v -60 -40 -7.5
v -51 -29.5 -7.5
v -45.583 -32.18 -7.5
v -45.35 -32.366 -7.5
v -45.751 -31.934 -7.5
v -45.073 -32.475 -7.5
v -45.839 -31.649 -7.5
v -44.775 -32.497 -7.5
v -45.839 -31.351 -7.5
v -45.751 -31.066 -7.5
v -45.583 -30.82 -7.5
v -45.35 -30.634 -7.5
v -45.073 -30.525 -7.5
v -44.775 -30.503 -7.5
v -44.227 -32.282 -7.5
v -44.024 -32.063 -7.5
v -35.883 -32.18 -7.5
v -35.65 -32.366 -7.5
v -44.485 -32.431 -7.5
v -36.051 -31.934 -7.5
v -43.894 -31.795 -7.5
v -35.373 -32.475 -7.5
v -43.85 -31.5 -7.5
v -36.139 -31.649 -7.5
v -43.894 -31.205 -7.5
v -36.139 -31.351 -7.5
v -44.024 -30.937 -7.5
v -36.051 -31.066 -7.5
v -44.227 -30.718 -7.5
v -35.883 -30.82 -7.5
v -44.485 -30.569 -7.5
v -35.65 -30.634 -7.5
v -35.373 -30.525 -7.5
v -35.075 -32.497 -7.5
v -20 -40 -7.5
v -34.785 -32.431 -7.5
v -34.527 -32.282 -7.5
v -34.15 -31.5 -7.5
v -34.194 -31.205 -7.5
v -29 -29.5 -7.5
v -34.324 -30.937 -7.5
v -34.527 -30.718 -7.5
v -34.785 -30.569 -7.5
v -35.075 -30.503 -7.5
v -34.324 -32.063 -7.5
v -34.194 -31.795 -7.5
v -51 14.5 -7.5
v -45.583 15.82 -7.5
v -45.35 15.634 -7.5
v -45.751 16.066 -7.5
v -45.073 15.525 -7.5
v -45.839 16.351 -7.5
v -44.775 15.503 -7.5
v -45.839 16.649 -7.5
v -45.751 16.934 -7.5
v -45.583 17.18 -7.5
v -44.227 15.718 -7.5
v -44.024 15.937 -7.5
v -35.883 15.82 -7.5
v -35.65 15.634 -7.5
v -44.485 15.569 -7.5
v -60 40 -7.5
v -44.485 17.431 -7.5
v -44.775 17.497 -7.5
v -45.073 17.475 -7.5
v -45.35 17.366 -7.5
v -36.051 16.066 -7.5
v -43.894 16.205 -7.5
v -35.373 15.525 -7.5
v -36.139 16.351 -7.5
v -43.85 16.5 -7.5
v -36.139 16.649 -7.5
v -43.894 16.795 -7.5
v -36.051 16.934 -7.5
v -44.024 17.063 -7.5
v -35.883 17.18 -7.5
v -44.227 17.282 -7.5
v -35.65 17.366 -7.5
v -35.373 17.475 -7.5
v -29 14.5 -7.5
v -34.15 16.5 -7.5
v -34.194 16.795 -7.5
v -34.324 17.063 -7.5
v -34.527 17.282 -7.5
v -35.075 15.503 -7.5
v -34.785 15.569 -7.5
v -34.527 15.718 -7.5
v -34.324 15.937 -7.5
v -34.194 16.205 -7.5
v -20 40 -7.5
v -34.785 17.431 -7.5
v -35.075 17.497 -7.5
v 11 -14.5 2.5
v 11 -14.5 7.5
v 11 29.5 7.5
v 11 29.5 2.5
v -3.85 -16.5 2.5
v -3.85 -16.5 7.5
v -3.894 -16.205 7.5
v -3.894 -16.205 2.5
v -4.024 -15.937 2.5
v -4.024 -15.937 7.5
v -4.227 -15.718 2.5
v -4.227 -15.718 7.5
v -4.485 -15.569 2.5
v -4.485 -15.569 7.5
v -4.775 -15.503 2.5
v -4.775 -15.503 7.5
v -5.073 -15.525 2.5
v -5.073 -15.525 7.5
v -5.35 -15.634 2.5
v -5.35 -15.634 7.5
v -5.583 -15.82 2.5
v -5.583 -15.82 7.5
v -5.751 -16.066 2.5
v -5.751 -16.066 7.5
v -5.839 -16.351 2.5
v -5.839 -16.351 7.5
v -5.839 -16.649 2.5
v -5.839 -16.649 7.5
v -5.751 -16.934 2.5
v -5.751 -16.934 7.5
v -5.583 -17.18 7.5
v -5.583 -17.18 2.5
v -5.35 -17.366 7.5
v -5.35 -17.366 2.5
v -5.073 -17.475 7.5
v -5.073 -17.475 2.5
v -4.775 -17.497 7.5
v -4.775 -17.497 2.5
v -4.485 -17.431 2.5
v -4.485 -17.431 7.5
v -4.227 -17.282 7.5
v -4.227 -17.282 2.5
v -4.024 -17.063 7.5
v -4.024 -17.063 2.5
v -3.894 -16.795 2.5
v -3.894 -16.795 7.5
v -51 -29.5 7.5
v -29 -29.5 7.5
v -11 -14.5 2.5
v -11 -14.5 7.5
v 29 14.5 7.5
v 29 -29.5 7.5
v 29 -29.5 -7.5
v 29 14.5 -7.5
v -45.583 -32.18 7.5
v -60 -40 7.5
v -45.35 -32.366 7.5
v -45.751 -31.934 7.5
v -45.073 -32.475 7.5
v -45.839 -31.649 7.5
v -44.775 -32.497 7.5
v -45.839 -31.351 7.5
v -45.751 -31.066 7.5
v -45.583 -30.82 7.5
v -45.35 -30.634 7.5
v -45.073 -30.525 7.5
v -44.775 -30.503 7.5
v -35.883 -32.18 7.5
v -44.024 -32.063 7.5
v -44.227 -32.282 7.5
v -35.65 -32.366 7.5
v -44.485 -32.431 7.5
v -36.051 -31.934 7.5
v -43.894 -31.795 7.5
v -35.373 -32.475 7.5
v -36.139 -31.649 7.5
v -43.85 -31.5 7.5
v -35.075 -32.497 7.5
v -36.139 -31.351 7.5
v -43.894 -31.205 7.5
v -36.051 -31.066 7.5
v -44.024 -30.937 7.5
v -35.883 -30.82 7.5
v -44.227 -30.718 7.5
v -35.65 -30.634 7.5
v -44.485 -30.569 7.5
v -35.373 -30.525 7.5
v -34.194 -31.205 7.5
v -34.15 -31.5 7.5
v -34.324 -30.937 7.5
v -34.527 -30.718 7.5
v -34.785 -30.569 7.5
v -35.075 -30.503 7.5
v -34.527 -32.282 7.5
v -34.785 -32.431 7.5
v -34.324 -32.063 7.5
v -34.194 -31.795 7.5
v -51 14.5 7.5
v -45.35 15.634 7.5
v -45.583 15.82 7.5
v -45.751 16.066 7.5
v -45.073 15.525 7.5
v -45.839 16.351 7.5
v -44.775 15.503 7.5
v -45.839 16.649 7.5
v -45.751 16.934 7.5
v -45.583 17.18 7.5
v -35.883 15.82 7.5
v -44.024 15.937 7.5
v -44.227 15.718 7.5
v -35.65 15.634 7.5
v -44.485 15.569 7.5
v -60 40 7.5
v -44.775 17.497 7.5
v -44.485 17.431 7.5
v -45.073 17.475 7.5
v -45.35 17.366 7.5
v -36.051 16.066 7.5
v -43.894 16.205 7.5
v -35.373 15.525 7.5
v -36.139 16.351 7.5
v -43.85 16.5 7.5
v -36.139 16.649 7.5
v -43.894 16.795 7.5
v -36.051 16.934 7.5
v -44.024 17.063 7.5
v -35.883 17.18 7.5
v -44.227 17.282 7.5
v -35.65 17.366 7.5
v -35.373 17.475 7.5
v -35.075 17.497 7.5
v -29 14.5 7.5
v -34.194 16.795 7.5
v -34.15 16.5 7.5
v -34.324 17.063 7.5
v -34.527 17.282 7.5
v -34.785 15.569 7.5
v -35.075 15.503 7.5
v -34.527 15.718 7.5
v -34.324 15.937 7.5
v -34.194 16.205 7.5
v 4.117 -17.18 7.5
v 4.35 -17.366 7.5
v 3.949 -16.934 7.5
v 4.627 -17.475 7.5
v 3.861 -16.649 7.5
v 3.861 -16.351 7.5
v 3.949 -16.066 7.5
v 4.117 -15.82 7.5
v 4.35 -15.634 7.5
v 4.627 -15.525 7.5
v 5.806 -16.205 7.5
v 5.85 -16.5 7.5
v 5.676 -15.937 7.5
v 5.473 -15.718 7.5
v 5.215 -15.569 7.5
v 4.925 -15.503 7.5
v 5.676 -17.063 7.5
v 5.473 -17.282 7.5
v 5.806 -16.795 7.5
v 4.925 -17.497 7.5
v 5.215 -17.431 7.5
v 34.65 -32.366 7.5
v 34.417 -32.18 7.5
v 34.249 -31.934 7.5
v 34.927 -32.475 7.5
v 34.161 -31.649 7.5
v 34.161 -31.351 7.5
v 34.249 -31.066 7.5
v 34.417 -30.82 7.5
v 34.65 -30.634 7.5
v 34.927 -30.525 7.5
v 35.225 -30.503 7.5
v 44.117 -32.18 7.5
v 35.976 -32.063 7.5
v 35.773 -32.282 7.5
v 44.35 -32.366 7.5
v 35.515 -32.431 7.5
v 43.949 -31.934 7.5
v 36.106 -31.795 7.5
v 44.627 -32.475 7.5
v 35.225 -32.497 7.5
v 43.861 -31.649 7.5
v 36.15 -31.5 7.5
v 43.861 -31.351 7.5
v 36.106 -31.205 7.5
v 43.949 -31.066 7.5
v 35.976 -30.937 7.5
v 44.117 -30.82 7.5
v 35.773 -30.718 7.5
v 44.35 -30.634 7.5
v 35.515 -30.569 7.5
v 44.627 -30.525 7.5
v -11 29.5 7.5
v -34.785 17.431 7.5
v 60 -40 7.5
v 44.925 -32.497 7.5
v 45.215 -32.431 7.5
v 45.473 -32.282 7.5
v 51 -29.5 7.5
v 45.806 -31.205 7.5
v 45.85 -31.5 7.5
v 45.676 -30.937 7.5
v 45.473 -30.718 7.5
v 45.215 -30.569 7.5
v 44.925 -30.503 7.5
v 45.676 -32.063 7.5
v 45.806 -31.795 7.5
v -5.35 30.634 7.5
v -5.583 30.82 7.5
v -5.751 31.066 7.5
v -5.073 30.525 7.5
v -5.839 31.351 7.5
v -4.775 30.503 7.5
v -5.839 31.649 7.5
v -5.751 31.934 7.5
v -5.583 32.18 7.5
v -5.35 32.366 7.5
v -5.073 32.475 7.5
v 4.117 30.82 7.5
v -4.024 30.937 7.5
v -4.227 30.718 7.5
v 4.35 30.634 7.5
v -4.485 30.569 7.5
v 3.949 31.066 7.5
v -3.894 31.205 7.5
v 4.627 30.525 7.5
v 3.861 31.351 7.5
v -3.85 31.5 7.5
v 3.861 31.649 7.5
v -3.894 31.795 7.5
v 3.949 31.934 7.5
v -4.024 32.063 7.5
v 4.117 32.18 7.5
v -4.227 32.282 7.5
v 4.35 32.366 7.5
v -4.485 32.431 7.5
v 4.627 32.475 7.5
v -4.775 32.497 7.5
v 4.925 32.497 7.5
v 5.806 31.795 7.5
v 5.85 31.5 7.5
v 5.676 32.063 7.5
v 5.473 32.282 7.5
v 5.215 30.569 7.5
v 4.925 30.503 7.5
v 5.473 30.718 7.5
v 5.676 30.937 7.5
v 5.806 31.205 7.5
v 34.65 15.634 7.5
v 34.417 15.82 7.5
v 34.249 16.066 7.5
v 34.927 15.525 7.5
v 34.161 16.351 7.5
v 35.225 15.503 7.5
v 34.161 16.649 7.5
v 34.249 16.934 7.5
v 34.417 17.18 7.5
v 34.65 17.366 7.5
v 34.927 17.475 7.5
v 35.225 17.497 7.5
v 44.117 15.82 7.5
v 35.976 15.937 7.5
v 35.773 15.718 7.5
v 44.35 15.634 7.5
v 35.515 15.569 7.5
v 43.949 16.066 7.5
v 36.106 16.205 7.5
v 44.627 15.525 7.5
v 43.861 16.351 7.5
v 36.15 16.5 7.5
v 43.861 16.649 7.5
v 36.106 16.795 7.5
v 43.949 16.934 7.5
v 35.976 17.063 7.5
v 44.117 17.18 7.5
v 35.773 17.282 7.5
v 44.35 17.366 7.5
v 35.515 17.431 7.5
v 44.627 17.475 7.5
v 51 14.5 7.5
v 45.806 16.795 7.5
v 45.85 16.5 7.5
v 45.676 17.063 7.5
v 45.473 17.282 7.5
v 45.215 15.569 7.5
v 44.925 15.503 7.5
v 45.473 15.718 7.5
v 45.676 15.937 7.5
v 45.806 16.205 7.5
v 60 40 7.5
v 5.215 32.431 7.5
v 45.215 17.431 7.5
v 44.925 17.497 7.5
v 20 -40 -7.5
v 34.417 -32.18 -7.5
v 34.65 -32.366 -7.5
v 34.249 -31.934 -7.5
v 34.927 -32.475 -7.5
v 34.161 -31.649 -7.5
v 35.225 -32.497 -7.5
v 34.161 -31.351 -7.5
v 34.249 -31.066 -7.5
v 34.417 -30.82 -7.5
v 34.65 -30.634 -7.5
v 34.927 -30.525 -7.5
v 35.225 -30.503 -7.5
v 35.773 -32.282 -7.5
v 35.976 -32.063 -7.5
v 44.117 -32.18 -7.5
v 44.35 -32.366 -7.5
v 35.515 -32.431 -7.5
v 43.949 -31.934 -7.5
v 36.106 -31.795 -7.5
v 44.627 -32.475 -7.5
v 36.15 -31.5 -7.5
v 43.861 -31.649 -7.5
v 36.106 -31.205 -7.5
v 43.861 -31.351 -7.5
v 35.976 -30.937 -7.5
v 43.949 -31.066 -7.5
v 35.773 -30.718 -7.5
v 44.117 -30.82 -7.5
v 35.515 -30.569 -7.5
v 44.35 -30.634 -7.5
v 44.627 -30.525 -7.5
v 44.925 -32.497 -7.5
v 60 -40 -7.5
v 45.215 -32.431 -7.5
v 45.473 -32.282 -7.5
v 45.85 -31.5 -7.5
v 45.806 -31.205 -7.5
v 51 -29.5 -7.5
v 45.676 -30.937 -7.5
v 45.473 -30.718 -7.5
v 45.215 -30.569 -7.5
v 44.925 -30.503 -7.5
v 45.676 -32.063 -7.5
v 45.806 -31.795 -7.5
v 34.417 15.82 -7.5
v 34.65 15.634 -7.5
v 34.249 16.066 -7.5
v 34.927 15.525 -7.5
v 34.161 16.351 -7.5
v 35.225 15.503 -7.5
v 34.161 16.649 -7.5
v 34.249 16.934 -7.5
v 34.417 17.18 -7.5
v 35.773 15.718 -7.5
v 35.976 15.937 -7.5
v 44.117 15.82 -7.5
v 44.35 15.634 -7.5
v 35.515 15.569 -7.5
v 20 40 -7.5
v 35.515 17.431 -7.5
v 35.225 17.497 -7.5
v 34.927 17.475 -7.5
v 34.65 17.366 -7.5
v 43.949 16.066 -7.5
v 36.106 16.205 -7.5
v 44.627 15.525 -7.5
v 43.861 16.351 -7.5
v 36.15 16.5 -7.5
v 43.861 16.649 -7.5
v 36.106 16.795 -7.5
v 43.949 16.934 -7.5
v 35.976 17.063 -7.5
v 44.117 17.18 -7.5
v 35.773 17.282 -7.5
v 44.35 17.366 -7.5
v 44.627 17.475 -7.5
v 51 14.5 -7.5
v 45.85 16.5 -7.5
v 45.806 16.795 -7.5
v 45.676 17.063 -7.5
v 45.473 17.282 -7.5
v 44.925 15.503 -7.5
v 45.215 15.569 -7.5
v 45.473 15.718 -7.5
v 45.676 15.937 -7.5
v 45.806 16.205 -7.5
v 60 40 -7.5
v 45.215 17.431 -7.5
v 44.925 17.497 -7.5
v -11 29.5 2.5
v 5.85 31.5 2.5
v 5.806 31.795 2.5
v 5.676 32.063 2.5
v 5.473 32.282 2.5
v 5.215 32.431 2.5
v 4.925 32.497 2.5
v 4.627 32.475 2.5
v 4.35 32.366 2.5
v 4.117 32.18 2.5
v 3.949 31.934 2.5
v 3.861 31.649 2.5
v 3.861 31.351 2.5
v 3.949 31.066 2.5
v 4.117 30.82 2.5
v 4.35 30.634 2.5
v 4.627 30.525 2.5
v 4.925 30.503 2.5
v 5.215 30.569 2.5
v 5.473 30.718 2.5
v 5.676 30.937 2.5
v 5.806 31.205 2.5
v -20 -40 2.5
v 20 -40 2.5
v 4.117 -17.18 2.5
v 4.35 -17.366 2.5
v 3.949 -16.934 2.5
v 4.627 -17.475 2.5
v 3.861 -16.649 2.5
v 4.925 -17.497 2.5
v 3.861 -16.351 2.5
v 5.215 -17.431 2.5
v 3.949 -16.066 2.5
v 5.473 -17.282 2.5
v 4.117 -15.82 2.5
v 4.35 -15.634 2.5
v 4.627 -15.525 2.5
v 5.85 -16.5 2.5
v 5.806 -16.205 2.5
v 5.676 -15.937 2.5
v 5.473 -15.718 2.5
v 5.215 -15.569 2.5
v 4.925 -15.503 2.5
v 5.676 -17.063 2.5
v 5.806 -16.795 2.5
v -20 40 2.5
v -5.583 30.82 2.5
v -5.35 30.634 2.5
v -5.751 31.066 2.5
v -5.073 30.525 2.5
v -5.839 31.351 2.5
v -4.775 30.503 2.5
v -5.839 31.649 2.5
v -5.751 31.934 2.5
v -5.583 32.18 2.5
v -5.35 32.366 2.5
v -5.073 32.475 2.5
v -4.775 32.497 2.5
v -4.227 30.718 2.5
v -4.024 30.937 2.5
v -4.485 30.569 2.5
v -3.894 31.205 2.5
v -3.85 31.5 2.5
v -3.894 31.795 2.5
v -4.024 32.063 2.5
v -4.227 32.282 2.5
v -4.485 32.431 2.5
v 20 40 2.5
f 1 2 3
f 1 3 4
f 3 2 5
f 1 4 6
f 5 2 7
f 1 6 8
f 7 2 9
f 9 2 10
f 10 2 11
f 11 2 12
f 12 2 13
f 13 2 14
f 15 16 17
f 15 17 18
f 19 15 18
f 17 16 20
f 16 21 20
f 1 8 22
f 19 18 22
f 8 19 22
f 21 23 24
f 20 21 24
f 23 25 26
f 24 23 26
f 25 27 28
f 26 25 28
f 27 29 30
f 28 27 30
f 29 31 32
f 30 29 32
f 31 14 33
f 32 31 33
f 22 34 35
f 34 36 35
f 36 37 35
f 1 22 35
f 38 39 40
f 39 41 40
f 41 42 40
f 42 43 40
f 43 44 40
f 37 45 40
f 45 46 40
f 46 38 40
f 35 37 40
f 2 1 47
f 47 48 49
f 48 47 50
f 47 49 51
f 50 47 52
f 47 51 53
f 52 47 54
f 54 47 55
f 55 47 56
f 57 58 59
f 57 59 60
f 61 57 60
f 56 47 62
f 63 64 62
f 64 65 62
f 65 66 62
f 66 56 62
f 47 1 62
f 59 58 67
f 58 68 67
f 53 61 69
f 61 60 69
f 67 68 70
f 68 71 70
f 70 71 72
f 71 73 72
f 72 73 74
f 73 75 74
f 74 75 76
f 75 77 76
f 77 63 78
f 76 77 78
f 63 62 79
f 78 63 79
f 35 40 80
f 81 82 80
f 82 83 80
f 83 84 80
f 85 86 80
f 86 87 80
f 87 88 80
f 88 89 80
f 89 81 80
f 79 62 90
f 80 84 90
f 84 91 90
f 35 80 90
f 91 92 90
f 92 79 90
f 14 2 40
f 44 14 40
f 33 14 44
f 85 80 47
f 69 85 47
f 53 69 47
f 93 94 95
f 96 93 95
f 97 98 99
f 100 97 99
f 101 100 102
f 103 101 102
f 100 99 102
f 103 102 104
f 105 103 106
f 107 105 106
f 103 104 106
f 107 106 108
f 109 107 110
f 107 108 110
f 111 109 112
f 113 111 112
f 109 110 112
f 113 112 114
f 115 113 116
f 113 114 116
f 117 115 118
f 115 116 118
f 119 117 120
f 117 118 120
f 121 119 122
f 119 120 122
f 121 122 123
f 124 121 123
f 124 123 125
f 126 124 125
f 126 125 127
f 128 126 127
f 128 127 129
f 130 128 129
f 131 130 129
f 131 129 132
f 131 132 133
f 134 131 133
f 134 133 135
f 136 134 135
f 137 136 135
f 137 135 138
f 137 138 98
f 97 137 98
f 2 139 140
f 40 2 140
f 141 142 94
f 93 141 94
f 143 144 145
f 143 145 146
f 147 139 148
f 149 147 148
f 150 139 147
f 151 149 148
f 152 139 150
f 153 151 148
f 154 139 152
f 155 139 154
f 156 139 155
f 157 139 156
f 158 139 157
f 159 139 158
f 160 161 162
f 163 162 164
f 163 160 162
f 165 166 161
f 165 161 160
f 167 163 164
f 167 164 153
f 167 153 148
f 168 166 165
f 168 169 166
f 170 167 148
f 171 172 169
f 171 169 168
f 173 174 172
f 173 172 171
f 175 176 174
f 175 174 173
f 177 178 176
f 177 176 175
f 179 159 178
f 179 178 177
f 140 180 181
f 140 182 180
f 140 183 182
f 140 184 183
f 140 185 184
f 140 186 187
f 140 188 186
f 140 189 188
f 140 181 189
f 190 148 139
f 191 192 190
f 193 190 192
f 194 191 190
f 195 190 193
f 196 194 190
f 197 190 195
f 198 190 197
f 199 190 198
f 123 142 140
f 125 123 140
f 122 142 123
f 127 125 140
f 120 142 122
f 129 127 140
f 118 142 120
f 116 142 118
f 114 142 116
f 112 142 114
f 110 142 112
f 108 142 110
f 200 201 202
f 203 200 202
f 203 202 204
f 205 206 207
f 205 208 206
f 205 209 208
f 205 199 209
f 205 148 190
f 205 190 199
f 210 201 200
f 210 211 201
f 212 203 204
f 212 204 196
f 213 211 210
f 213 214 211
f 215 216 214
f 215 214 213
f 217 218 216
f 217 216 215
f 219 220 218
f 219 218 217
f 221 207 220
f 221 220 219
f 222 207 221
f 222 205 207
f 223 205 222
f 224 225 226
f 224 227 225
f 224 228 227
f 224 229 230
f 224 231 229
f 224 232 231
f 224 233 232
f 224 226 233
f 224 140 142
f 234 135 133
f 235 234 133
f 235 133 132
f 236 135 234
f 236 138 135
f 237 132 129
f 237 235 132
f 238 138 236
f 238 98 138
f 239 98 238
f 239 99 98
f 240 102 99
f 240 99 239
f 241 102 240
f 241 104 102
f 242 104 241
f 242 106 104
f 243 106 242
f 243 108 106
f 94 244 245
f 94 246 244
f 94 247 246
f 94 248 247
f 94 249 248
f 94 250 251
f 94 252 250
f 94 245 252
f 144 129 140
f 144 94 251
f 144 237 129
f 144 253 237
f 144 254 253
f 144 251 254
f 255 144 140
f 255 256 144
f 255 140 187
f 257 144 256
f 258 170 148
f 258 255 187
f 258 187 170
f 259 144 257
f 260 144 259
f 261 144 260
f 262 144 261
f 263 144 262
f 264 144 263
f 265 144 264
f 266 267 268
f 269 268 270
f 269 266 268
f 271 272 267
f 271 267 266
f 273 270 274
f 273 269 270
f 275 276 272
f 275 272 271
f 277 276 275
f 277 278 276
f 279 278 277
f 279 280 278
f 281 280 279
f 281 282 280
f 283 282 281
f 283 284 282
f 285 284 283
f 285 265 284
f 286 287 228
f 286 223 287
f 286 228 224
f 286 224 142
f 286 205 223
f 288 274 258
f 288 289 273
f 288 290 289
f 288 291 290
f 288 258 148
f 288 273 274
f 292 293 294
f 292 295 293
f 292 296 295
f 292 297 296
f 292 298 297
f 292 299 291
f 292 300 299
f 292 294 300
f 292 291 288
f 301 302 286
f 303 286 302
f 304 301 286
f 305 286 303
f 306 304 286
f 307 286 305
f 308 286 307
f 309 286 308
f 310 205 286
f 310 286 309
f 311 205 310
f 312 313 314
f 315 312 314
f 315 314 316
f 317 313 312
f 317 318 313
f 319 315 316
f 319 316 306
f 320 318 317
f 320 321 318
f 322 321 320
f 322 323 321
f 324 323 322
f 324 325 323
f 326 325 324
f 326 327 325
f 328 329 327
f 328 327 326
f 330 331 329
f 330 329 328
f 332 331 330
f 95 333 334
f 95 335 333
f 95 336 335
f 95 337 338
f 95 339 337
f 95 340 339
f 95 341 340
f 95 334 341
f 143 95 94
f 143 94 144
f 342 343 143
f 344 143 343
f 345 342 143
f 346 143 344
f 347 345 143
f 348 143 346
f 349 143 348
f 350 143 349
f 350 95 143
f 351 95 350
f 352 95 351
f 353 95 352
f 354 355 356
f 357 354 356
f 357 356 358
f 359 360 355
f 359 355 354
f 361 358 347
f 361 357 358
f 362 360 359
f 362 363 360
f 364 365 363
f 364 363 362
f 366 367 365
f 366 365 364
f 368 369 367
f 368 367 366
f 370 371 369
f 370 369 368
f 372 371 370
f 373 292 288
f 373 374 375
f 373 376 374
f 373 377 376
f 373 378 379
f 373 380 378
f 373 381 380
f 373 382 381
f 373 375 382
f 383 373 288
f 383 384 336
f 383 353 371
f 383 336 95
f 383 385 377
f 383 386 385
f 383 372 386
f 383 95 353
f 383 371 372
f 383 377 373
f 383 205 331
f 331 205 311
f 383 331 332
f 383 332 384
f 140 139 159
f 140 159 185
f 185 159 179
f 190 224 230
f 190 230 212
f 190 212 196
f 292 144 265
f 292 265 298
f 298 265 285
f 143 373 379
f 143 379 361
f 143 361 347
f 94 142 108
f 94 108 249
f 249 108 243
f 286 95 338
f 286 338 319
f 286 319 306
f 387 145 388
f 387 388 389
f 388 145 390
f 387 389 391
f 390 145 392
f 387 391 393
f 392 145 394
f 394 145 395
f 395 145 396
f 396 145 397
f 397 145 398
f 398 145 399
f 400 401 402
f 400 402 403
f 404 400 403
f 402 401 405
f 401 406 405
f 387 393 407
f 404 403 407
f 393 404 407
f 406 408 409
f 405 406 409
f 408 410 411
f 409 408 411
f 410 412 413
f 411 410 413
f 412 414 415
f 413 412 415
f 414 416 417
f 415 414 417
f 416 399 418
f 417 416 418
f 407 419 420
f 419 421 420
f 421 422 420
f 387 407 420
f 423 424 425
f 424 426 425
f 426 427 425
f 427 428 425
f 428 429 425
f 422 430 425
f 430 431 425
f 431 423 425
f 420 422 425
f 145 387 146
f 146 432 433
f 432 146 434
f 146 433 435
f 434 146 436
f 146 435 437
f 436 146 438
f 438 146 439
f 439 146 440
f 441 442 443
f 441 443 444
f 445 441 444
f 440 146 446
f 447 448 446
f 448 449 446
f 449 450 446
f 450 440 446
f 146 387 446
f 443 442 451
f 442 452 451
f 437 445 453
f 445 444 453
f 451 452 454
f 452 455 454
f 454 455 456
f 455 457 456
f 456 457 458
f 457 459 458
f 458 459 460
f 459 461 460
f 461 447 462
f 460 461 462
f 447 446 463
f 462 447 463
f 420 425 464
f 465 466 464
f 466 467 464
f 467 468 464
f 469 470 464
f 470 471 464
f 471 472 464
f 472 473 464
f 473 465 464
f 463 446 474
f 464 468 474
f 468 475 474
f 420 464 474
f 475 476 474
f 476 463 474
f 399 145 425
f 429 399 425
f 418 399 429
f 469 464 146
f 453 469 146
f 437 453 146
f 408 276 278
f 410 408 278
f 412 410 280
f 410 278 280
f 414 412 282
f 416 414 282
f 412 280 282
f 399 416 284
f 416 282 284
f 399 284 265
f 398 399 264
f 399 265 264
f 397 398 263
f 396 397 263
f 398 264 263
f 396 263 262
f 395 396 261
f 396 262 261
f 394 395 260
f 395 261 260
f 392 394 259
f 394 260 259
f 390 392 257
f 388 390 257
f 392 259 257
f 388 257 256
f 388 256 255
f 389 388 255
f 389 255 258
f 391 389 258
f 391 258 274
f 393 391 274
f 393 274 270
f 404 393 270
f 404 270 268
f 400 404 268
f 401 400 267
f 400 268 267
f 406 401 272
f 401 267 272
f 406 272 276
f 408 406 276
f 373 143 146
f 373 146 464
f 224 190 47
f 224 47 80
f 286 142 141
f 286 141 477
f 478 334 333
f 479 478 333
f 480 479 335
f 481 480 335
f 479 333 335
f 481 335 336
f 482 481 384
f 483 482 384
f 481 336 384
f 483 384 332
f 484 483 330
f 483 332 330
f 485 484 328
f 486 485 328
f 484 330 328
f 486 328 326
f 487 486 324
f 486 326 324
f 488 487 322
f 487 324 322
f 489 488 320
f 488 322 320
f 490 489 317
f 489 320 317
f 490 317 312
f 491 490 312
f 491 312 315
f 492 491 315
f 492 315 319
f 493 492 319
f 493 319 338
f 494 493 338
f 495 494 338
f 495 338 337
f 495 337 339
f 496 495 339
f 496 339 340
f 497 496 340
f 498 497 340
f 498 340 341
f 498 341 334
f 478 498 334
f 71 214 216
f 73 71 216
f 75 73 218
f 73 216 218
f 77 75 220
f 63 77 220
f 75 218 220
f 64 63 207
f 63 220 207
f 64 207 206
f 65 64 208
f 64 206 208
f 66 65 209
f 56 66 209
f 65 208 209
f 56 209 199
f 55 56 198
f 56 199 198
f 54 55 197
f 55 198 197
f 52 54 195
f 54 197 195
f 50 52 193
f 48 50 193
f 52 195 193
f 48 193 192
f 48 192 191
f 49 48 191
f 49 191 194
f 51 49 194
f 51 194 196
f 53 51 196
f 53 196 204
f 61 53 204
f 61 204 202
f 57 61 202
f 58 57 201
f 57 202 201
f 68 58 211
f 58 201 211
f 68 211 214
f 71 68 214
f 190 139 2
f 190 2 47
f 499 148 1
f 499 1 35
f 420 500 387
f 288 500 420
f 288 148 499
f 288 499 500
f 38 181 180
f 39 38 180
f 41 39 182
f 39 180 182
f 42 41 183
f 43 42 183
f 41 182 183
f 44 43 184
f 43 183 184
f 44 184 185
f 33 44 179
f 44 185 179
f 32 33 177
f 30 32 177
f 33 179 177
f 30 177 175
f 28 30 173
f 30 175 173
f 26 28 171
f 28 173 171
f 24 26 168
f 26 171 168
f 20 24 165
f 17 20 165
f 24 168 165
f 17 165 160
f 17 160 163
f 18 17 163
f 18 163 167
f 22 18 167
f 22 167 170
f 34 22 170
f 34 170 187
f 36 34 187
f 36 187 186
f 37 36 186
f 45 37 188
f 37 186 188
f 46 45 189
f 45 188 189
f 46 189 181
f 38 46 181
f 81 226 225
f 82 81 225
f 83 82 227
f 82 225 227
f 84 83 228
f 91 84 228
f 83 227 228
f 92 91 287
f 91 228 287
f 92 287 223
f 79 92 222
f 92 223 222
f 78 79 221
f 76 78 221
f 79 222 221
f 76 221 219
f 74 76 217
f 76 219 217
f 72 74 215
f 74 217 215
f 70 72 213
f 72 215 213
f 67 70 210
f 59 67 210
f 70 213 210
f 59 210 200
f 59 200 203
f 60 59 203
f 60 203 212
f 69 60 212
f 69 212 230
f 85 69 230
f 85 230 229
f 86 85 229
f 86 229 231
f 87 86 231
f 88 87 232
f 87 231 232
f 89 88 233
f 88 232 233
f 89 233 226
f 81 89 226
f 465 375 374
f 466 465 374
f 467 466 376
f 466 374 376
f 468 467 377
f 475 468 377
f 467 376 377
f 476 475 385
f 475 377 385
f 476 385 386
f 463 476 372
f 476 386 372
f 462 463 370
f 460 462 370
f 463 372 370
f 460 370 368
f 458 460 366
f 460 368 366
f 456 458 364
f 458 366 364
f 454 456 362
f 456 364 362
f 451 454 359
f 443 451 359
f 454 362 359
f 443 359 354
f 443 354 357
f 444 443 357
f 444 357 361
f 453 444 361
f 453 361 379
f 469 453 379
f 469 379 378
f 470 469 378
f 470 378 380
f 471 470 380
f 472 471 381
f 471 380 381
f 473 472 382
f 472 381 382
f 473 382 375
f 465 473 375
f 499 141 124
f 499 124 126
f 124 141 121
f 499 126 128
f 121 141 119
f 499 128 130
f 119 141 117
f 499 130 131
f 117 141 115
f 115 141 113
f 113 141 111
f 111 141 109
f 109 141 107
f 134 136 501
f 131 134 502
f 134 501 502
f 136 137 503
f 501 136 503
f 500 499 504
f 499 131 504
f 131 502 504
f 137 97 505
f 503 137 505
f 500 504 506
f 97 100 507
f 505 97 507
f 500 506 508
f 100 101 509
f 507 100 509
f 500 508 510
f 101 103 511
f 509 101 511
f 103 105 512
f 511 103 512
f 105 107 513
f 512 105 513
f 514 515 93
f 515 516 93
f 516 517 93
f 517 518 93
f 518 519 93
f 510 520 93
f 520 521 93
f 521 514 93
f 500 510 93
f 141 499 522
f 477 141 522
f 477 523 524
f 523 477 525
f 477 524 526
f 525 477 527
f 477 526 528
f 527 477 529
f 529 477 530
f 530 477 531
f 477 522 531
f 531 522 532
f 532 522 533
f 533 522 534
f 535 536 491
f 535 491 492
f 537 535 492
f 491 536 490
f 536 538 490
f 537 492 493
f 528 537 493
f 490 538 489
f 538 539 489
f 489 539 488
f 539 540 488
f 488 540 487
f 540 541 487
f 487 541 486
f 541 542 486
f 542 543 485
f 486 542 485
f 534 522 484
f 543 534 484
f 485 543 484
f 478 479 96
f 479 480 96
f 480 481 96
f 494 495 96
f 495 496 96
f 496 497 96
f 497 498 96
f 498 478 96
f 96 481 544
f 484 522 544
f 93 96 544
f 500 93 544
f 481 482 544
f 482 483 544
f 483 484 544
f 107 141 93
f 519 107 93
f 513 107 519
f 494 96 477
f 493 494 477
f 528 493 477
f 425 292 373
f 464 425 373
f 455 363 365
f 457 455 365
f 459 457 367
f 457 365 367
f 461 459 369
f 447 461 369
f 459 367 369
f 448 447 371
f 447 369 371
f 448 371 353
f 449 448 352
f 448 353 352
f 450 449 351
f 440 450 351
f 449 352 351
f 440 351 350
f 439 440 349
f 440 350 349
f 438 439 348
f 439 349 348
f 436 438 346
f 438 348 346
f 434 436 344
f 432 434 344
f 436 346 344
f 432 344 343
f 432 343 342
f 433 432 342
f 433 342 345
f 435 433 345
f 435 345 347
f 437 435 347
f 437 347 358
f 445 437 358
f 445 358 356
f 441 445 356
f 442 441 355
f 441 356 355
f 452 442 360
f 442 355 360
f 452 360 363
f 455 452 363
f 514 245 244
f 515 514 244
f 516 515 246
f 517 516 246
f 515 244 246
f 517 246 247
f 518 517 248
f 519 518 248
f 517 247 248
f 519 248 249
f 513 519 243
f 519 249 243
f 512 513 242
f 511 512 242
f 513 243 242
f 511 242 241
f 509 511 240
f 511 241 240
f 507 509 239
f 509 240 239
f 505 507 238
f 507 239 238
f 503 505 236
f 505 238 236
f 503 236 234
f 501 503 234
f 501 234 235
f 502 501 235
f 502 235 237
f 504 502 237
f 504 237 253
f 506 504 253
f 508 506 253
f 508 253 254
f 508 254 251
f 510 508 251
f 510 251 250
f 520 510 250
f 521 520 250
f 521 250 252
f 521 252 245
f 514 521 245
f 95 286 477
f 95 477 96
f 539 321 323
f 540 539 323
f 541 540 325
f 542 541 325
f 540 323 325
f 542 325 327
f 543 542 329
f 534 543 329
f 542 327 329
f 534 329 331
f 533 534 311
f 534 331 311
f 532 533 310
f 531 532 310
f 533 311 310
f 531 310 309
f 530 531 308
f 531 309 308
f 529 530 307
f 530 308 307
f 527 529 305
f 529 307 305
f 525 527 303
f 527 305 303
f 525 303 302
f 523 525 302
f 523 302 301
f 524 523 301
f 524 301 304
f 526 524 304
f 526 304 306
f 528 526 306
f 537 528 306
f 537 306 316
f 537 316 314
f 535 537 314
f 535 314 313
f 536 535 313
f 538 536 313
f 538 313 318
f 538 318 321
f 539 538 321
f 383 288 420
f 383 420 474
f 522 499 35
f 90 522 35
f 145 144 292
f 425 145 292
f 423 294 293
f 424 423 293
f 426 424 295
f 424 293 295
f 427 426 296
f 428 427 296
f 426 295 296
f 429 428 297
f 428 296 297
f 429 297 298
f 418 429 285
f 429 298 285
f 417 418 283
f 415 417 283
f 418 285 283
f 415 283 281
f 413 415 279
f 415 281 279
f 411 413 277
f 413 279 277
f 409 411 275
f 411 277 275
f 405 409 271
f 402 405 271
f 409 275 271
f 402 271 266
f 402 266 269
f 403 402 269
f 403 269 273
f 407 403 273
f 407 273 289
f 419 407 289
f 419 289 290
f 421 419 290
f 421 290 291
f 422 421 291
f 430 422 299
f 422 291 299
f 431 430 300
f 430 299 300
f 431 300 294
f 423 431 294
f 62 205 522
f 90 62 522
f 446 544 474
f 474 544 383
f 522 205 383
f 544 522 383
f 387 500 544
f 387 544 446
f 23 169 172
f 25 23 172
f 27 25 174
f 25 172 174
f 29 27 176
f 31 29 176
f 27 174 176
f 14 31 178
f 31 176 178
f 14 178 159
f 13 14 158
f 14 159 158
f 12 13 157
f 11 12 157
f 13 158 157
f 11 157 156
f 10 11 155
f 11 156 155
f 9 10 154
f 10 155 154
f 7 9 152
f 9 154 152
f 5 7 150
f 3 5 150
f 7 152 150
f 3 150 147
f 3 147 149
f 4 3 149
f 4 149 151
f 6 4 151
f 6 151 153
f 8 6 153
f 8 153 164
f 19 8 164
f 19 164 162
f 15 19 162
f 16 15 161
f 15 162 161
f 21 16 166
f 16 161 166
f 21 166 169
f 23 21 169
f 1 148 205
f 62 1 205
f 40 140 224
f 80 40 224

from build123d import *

# Parameters (mm, degrees)
SKETCH1_W           = 120
SKETCH1_H           = 80
BOSS_EXTRUDE1_DEPTH = 7.5
SKETCH2_R           = 1
SKETCH2_W           = 22
SKETCH2_H           = 44
CUT_EXTRUDE1_DEPTH  = 15
CUT_EXTRUDE2_REACH  = 102.281
SKETCH3_W           = 40
SKETCH3_H           = 10


with BuildPart() as part:
    # Sketch1 → Boss-Extrude1 (new, symmetric)
    with BuildSketch(Plane.XY):
        Rectangle(SKETCH1_W, SKETCH1_H)
    extrude(amount=BOSS_EXTRUDE1_DEPTH, both=True)

    # Sketch2 → Cut-Extrude1 (cut)
    with BuildSketch(Plane.XY.offset(7.5)):
        with Locations((-44.85, -31.5)):
            Circle(SKETCH2_R)
        with Locations((-35.15, -31.5)):
            Circle(SKETCH2_R)
        with Locations((-35.15, 16.5)):
            Circle(SKETCH2_R)
        with Locations((-44.85, 16.5)):
            Circle(SKETCH2_R)
        with Locations((35.15, -31.5)):
            Circle(SKETCH2_R)
        with Locations((44.85, -31.5)):
            Circle(SKETCH2_R)
        with Locations((44.85, 16.5)):
            Circle(SKETCH2_R)
        with Locations((35.15, 16.5)):
            Circle(SKETCH2_R)
        with Locations((-4.85, -16.5)):
            Circle(SKETCH2_R)
        with Locations((4.85, -16.5)):
            Circle(SKETCH2_R)
        with Locations((4.85, 31.5)):
            Circle(SKETCH2_R)
        with Locations((-4.85, 31.5)):
            Circle(SKETCH2_R)
        with Locations((-40, -7.5)):
            Rectangle(SKETCH2_W, SKETCH2_H)
        with Locations((40, -7.5)):
            Rectangle(SKETCH2_W, SKETCH2_H)
        with Locations((0, 7.5)):
            Rectangle(SKETCH2_W, SKETCH2_H)
    extrude(amount=-CUT_EXTRUDE1_DEPTH, mode=Mode.SUBTRACT)

    # Cut-Extrude2: up to this face of the body (flat: up to its plane)
    cut_extrude2_end = Plane(part.part.faces().sort_by_distance((0, -40, 0))[0])
    # Sketch3 → Cut-Extrude2 (cut, up to the picked face)
    with BuildSketch(Plane(origin=(0, 40, 0), x_dir=(1, 0, 0), z_dir=(0, 1, 0)), mode=Mode.PRIVATE) as cut_extrude2_sk1:
        with Locations((0, 2.5)):
            Rectangle(SKETCH3_W, SKETCH3_H)
    cut_extrude2_tool1 = split(extrude(cut_extrude2_sk1.sketch, amount=-CUT_EXTRUDE2_REACH, mode=Mode.PRIVATE), bisect_by=cut_extrude2_end, keep=Keep.BOTH, mode=Mode.PRIVATE)
    add(cut_extrude2_tool1.solids().sort_by(Axis((0, 40, -2.5), (0, -1, 0)))[0], mode=Mode.SUBTRACT)


solid = part.part
